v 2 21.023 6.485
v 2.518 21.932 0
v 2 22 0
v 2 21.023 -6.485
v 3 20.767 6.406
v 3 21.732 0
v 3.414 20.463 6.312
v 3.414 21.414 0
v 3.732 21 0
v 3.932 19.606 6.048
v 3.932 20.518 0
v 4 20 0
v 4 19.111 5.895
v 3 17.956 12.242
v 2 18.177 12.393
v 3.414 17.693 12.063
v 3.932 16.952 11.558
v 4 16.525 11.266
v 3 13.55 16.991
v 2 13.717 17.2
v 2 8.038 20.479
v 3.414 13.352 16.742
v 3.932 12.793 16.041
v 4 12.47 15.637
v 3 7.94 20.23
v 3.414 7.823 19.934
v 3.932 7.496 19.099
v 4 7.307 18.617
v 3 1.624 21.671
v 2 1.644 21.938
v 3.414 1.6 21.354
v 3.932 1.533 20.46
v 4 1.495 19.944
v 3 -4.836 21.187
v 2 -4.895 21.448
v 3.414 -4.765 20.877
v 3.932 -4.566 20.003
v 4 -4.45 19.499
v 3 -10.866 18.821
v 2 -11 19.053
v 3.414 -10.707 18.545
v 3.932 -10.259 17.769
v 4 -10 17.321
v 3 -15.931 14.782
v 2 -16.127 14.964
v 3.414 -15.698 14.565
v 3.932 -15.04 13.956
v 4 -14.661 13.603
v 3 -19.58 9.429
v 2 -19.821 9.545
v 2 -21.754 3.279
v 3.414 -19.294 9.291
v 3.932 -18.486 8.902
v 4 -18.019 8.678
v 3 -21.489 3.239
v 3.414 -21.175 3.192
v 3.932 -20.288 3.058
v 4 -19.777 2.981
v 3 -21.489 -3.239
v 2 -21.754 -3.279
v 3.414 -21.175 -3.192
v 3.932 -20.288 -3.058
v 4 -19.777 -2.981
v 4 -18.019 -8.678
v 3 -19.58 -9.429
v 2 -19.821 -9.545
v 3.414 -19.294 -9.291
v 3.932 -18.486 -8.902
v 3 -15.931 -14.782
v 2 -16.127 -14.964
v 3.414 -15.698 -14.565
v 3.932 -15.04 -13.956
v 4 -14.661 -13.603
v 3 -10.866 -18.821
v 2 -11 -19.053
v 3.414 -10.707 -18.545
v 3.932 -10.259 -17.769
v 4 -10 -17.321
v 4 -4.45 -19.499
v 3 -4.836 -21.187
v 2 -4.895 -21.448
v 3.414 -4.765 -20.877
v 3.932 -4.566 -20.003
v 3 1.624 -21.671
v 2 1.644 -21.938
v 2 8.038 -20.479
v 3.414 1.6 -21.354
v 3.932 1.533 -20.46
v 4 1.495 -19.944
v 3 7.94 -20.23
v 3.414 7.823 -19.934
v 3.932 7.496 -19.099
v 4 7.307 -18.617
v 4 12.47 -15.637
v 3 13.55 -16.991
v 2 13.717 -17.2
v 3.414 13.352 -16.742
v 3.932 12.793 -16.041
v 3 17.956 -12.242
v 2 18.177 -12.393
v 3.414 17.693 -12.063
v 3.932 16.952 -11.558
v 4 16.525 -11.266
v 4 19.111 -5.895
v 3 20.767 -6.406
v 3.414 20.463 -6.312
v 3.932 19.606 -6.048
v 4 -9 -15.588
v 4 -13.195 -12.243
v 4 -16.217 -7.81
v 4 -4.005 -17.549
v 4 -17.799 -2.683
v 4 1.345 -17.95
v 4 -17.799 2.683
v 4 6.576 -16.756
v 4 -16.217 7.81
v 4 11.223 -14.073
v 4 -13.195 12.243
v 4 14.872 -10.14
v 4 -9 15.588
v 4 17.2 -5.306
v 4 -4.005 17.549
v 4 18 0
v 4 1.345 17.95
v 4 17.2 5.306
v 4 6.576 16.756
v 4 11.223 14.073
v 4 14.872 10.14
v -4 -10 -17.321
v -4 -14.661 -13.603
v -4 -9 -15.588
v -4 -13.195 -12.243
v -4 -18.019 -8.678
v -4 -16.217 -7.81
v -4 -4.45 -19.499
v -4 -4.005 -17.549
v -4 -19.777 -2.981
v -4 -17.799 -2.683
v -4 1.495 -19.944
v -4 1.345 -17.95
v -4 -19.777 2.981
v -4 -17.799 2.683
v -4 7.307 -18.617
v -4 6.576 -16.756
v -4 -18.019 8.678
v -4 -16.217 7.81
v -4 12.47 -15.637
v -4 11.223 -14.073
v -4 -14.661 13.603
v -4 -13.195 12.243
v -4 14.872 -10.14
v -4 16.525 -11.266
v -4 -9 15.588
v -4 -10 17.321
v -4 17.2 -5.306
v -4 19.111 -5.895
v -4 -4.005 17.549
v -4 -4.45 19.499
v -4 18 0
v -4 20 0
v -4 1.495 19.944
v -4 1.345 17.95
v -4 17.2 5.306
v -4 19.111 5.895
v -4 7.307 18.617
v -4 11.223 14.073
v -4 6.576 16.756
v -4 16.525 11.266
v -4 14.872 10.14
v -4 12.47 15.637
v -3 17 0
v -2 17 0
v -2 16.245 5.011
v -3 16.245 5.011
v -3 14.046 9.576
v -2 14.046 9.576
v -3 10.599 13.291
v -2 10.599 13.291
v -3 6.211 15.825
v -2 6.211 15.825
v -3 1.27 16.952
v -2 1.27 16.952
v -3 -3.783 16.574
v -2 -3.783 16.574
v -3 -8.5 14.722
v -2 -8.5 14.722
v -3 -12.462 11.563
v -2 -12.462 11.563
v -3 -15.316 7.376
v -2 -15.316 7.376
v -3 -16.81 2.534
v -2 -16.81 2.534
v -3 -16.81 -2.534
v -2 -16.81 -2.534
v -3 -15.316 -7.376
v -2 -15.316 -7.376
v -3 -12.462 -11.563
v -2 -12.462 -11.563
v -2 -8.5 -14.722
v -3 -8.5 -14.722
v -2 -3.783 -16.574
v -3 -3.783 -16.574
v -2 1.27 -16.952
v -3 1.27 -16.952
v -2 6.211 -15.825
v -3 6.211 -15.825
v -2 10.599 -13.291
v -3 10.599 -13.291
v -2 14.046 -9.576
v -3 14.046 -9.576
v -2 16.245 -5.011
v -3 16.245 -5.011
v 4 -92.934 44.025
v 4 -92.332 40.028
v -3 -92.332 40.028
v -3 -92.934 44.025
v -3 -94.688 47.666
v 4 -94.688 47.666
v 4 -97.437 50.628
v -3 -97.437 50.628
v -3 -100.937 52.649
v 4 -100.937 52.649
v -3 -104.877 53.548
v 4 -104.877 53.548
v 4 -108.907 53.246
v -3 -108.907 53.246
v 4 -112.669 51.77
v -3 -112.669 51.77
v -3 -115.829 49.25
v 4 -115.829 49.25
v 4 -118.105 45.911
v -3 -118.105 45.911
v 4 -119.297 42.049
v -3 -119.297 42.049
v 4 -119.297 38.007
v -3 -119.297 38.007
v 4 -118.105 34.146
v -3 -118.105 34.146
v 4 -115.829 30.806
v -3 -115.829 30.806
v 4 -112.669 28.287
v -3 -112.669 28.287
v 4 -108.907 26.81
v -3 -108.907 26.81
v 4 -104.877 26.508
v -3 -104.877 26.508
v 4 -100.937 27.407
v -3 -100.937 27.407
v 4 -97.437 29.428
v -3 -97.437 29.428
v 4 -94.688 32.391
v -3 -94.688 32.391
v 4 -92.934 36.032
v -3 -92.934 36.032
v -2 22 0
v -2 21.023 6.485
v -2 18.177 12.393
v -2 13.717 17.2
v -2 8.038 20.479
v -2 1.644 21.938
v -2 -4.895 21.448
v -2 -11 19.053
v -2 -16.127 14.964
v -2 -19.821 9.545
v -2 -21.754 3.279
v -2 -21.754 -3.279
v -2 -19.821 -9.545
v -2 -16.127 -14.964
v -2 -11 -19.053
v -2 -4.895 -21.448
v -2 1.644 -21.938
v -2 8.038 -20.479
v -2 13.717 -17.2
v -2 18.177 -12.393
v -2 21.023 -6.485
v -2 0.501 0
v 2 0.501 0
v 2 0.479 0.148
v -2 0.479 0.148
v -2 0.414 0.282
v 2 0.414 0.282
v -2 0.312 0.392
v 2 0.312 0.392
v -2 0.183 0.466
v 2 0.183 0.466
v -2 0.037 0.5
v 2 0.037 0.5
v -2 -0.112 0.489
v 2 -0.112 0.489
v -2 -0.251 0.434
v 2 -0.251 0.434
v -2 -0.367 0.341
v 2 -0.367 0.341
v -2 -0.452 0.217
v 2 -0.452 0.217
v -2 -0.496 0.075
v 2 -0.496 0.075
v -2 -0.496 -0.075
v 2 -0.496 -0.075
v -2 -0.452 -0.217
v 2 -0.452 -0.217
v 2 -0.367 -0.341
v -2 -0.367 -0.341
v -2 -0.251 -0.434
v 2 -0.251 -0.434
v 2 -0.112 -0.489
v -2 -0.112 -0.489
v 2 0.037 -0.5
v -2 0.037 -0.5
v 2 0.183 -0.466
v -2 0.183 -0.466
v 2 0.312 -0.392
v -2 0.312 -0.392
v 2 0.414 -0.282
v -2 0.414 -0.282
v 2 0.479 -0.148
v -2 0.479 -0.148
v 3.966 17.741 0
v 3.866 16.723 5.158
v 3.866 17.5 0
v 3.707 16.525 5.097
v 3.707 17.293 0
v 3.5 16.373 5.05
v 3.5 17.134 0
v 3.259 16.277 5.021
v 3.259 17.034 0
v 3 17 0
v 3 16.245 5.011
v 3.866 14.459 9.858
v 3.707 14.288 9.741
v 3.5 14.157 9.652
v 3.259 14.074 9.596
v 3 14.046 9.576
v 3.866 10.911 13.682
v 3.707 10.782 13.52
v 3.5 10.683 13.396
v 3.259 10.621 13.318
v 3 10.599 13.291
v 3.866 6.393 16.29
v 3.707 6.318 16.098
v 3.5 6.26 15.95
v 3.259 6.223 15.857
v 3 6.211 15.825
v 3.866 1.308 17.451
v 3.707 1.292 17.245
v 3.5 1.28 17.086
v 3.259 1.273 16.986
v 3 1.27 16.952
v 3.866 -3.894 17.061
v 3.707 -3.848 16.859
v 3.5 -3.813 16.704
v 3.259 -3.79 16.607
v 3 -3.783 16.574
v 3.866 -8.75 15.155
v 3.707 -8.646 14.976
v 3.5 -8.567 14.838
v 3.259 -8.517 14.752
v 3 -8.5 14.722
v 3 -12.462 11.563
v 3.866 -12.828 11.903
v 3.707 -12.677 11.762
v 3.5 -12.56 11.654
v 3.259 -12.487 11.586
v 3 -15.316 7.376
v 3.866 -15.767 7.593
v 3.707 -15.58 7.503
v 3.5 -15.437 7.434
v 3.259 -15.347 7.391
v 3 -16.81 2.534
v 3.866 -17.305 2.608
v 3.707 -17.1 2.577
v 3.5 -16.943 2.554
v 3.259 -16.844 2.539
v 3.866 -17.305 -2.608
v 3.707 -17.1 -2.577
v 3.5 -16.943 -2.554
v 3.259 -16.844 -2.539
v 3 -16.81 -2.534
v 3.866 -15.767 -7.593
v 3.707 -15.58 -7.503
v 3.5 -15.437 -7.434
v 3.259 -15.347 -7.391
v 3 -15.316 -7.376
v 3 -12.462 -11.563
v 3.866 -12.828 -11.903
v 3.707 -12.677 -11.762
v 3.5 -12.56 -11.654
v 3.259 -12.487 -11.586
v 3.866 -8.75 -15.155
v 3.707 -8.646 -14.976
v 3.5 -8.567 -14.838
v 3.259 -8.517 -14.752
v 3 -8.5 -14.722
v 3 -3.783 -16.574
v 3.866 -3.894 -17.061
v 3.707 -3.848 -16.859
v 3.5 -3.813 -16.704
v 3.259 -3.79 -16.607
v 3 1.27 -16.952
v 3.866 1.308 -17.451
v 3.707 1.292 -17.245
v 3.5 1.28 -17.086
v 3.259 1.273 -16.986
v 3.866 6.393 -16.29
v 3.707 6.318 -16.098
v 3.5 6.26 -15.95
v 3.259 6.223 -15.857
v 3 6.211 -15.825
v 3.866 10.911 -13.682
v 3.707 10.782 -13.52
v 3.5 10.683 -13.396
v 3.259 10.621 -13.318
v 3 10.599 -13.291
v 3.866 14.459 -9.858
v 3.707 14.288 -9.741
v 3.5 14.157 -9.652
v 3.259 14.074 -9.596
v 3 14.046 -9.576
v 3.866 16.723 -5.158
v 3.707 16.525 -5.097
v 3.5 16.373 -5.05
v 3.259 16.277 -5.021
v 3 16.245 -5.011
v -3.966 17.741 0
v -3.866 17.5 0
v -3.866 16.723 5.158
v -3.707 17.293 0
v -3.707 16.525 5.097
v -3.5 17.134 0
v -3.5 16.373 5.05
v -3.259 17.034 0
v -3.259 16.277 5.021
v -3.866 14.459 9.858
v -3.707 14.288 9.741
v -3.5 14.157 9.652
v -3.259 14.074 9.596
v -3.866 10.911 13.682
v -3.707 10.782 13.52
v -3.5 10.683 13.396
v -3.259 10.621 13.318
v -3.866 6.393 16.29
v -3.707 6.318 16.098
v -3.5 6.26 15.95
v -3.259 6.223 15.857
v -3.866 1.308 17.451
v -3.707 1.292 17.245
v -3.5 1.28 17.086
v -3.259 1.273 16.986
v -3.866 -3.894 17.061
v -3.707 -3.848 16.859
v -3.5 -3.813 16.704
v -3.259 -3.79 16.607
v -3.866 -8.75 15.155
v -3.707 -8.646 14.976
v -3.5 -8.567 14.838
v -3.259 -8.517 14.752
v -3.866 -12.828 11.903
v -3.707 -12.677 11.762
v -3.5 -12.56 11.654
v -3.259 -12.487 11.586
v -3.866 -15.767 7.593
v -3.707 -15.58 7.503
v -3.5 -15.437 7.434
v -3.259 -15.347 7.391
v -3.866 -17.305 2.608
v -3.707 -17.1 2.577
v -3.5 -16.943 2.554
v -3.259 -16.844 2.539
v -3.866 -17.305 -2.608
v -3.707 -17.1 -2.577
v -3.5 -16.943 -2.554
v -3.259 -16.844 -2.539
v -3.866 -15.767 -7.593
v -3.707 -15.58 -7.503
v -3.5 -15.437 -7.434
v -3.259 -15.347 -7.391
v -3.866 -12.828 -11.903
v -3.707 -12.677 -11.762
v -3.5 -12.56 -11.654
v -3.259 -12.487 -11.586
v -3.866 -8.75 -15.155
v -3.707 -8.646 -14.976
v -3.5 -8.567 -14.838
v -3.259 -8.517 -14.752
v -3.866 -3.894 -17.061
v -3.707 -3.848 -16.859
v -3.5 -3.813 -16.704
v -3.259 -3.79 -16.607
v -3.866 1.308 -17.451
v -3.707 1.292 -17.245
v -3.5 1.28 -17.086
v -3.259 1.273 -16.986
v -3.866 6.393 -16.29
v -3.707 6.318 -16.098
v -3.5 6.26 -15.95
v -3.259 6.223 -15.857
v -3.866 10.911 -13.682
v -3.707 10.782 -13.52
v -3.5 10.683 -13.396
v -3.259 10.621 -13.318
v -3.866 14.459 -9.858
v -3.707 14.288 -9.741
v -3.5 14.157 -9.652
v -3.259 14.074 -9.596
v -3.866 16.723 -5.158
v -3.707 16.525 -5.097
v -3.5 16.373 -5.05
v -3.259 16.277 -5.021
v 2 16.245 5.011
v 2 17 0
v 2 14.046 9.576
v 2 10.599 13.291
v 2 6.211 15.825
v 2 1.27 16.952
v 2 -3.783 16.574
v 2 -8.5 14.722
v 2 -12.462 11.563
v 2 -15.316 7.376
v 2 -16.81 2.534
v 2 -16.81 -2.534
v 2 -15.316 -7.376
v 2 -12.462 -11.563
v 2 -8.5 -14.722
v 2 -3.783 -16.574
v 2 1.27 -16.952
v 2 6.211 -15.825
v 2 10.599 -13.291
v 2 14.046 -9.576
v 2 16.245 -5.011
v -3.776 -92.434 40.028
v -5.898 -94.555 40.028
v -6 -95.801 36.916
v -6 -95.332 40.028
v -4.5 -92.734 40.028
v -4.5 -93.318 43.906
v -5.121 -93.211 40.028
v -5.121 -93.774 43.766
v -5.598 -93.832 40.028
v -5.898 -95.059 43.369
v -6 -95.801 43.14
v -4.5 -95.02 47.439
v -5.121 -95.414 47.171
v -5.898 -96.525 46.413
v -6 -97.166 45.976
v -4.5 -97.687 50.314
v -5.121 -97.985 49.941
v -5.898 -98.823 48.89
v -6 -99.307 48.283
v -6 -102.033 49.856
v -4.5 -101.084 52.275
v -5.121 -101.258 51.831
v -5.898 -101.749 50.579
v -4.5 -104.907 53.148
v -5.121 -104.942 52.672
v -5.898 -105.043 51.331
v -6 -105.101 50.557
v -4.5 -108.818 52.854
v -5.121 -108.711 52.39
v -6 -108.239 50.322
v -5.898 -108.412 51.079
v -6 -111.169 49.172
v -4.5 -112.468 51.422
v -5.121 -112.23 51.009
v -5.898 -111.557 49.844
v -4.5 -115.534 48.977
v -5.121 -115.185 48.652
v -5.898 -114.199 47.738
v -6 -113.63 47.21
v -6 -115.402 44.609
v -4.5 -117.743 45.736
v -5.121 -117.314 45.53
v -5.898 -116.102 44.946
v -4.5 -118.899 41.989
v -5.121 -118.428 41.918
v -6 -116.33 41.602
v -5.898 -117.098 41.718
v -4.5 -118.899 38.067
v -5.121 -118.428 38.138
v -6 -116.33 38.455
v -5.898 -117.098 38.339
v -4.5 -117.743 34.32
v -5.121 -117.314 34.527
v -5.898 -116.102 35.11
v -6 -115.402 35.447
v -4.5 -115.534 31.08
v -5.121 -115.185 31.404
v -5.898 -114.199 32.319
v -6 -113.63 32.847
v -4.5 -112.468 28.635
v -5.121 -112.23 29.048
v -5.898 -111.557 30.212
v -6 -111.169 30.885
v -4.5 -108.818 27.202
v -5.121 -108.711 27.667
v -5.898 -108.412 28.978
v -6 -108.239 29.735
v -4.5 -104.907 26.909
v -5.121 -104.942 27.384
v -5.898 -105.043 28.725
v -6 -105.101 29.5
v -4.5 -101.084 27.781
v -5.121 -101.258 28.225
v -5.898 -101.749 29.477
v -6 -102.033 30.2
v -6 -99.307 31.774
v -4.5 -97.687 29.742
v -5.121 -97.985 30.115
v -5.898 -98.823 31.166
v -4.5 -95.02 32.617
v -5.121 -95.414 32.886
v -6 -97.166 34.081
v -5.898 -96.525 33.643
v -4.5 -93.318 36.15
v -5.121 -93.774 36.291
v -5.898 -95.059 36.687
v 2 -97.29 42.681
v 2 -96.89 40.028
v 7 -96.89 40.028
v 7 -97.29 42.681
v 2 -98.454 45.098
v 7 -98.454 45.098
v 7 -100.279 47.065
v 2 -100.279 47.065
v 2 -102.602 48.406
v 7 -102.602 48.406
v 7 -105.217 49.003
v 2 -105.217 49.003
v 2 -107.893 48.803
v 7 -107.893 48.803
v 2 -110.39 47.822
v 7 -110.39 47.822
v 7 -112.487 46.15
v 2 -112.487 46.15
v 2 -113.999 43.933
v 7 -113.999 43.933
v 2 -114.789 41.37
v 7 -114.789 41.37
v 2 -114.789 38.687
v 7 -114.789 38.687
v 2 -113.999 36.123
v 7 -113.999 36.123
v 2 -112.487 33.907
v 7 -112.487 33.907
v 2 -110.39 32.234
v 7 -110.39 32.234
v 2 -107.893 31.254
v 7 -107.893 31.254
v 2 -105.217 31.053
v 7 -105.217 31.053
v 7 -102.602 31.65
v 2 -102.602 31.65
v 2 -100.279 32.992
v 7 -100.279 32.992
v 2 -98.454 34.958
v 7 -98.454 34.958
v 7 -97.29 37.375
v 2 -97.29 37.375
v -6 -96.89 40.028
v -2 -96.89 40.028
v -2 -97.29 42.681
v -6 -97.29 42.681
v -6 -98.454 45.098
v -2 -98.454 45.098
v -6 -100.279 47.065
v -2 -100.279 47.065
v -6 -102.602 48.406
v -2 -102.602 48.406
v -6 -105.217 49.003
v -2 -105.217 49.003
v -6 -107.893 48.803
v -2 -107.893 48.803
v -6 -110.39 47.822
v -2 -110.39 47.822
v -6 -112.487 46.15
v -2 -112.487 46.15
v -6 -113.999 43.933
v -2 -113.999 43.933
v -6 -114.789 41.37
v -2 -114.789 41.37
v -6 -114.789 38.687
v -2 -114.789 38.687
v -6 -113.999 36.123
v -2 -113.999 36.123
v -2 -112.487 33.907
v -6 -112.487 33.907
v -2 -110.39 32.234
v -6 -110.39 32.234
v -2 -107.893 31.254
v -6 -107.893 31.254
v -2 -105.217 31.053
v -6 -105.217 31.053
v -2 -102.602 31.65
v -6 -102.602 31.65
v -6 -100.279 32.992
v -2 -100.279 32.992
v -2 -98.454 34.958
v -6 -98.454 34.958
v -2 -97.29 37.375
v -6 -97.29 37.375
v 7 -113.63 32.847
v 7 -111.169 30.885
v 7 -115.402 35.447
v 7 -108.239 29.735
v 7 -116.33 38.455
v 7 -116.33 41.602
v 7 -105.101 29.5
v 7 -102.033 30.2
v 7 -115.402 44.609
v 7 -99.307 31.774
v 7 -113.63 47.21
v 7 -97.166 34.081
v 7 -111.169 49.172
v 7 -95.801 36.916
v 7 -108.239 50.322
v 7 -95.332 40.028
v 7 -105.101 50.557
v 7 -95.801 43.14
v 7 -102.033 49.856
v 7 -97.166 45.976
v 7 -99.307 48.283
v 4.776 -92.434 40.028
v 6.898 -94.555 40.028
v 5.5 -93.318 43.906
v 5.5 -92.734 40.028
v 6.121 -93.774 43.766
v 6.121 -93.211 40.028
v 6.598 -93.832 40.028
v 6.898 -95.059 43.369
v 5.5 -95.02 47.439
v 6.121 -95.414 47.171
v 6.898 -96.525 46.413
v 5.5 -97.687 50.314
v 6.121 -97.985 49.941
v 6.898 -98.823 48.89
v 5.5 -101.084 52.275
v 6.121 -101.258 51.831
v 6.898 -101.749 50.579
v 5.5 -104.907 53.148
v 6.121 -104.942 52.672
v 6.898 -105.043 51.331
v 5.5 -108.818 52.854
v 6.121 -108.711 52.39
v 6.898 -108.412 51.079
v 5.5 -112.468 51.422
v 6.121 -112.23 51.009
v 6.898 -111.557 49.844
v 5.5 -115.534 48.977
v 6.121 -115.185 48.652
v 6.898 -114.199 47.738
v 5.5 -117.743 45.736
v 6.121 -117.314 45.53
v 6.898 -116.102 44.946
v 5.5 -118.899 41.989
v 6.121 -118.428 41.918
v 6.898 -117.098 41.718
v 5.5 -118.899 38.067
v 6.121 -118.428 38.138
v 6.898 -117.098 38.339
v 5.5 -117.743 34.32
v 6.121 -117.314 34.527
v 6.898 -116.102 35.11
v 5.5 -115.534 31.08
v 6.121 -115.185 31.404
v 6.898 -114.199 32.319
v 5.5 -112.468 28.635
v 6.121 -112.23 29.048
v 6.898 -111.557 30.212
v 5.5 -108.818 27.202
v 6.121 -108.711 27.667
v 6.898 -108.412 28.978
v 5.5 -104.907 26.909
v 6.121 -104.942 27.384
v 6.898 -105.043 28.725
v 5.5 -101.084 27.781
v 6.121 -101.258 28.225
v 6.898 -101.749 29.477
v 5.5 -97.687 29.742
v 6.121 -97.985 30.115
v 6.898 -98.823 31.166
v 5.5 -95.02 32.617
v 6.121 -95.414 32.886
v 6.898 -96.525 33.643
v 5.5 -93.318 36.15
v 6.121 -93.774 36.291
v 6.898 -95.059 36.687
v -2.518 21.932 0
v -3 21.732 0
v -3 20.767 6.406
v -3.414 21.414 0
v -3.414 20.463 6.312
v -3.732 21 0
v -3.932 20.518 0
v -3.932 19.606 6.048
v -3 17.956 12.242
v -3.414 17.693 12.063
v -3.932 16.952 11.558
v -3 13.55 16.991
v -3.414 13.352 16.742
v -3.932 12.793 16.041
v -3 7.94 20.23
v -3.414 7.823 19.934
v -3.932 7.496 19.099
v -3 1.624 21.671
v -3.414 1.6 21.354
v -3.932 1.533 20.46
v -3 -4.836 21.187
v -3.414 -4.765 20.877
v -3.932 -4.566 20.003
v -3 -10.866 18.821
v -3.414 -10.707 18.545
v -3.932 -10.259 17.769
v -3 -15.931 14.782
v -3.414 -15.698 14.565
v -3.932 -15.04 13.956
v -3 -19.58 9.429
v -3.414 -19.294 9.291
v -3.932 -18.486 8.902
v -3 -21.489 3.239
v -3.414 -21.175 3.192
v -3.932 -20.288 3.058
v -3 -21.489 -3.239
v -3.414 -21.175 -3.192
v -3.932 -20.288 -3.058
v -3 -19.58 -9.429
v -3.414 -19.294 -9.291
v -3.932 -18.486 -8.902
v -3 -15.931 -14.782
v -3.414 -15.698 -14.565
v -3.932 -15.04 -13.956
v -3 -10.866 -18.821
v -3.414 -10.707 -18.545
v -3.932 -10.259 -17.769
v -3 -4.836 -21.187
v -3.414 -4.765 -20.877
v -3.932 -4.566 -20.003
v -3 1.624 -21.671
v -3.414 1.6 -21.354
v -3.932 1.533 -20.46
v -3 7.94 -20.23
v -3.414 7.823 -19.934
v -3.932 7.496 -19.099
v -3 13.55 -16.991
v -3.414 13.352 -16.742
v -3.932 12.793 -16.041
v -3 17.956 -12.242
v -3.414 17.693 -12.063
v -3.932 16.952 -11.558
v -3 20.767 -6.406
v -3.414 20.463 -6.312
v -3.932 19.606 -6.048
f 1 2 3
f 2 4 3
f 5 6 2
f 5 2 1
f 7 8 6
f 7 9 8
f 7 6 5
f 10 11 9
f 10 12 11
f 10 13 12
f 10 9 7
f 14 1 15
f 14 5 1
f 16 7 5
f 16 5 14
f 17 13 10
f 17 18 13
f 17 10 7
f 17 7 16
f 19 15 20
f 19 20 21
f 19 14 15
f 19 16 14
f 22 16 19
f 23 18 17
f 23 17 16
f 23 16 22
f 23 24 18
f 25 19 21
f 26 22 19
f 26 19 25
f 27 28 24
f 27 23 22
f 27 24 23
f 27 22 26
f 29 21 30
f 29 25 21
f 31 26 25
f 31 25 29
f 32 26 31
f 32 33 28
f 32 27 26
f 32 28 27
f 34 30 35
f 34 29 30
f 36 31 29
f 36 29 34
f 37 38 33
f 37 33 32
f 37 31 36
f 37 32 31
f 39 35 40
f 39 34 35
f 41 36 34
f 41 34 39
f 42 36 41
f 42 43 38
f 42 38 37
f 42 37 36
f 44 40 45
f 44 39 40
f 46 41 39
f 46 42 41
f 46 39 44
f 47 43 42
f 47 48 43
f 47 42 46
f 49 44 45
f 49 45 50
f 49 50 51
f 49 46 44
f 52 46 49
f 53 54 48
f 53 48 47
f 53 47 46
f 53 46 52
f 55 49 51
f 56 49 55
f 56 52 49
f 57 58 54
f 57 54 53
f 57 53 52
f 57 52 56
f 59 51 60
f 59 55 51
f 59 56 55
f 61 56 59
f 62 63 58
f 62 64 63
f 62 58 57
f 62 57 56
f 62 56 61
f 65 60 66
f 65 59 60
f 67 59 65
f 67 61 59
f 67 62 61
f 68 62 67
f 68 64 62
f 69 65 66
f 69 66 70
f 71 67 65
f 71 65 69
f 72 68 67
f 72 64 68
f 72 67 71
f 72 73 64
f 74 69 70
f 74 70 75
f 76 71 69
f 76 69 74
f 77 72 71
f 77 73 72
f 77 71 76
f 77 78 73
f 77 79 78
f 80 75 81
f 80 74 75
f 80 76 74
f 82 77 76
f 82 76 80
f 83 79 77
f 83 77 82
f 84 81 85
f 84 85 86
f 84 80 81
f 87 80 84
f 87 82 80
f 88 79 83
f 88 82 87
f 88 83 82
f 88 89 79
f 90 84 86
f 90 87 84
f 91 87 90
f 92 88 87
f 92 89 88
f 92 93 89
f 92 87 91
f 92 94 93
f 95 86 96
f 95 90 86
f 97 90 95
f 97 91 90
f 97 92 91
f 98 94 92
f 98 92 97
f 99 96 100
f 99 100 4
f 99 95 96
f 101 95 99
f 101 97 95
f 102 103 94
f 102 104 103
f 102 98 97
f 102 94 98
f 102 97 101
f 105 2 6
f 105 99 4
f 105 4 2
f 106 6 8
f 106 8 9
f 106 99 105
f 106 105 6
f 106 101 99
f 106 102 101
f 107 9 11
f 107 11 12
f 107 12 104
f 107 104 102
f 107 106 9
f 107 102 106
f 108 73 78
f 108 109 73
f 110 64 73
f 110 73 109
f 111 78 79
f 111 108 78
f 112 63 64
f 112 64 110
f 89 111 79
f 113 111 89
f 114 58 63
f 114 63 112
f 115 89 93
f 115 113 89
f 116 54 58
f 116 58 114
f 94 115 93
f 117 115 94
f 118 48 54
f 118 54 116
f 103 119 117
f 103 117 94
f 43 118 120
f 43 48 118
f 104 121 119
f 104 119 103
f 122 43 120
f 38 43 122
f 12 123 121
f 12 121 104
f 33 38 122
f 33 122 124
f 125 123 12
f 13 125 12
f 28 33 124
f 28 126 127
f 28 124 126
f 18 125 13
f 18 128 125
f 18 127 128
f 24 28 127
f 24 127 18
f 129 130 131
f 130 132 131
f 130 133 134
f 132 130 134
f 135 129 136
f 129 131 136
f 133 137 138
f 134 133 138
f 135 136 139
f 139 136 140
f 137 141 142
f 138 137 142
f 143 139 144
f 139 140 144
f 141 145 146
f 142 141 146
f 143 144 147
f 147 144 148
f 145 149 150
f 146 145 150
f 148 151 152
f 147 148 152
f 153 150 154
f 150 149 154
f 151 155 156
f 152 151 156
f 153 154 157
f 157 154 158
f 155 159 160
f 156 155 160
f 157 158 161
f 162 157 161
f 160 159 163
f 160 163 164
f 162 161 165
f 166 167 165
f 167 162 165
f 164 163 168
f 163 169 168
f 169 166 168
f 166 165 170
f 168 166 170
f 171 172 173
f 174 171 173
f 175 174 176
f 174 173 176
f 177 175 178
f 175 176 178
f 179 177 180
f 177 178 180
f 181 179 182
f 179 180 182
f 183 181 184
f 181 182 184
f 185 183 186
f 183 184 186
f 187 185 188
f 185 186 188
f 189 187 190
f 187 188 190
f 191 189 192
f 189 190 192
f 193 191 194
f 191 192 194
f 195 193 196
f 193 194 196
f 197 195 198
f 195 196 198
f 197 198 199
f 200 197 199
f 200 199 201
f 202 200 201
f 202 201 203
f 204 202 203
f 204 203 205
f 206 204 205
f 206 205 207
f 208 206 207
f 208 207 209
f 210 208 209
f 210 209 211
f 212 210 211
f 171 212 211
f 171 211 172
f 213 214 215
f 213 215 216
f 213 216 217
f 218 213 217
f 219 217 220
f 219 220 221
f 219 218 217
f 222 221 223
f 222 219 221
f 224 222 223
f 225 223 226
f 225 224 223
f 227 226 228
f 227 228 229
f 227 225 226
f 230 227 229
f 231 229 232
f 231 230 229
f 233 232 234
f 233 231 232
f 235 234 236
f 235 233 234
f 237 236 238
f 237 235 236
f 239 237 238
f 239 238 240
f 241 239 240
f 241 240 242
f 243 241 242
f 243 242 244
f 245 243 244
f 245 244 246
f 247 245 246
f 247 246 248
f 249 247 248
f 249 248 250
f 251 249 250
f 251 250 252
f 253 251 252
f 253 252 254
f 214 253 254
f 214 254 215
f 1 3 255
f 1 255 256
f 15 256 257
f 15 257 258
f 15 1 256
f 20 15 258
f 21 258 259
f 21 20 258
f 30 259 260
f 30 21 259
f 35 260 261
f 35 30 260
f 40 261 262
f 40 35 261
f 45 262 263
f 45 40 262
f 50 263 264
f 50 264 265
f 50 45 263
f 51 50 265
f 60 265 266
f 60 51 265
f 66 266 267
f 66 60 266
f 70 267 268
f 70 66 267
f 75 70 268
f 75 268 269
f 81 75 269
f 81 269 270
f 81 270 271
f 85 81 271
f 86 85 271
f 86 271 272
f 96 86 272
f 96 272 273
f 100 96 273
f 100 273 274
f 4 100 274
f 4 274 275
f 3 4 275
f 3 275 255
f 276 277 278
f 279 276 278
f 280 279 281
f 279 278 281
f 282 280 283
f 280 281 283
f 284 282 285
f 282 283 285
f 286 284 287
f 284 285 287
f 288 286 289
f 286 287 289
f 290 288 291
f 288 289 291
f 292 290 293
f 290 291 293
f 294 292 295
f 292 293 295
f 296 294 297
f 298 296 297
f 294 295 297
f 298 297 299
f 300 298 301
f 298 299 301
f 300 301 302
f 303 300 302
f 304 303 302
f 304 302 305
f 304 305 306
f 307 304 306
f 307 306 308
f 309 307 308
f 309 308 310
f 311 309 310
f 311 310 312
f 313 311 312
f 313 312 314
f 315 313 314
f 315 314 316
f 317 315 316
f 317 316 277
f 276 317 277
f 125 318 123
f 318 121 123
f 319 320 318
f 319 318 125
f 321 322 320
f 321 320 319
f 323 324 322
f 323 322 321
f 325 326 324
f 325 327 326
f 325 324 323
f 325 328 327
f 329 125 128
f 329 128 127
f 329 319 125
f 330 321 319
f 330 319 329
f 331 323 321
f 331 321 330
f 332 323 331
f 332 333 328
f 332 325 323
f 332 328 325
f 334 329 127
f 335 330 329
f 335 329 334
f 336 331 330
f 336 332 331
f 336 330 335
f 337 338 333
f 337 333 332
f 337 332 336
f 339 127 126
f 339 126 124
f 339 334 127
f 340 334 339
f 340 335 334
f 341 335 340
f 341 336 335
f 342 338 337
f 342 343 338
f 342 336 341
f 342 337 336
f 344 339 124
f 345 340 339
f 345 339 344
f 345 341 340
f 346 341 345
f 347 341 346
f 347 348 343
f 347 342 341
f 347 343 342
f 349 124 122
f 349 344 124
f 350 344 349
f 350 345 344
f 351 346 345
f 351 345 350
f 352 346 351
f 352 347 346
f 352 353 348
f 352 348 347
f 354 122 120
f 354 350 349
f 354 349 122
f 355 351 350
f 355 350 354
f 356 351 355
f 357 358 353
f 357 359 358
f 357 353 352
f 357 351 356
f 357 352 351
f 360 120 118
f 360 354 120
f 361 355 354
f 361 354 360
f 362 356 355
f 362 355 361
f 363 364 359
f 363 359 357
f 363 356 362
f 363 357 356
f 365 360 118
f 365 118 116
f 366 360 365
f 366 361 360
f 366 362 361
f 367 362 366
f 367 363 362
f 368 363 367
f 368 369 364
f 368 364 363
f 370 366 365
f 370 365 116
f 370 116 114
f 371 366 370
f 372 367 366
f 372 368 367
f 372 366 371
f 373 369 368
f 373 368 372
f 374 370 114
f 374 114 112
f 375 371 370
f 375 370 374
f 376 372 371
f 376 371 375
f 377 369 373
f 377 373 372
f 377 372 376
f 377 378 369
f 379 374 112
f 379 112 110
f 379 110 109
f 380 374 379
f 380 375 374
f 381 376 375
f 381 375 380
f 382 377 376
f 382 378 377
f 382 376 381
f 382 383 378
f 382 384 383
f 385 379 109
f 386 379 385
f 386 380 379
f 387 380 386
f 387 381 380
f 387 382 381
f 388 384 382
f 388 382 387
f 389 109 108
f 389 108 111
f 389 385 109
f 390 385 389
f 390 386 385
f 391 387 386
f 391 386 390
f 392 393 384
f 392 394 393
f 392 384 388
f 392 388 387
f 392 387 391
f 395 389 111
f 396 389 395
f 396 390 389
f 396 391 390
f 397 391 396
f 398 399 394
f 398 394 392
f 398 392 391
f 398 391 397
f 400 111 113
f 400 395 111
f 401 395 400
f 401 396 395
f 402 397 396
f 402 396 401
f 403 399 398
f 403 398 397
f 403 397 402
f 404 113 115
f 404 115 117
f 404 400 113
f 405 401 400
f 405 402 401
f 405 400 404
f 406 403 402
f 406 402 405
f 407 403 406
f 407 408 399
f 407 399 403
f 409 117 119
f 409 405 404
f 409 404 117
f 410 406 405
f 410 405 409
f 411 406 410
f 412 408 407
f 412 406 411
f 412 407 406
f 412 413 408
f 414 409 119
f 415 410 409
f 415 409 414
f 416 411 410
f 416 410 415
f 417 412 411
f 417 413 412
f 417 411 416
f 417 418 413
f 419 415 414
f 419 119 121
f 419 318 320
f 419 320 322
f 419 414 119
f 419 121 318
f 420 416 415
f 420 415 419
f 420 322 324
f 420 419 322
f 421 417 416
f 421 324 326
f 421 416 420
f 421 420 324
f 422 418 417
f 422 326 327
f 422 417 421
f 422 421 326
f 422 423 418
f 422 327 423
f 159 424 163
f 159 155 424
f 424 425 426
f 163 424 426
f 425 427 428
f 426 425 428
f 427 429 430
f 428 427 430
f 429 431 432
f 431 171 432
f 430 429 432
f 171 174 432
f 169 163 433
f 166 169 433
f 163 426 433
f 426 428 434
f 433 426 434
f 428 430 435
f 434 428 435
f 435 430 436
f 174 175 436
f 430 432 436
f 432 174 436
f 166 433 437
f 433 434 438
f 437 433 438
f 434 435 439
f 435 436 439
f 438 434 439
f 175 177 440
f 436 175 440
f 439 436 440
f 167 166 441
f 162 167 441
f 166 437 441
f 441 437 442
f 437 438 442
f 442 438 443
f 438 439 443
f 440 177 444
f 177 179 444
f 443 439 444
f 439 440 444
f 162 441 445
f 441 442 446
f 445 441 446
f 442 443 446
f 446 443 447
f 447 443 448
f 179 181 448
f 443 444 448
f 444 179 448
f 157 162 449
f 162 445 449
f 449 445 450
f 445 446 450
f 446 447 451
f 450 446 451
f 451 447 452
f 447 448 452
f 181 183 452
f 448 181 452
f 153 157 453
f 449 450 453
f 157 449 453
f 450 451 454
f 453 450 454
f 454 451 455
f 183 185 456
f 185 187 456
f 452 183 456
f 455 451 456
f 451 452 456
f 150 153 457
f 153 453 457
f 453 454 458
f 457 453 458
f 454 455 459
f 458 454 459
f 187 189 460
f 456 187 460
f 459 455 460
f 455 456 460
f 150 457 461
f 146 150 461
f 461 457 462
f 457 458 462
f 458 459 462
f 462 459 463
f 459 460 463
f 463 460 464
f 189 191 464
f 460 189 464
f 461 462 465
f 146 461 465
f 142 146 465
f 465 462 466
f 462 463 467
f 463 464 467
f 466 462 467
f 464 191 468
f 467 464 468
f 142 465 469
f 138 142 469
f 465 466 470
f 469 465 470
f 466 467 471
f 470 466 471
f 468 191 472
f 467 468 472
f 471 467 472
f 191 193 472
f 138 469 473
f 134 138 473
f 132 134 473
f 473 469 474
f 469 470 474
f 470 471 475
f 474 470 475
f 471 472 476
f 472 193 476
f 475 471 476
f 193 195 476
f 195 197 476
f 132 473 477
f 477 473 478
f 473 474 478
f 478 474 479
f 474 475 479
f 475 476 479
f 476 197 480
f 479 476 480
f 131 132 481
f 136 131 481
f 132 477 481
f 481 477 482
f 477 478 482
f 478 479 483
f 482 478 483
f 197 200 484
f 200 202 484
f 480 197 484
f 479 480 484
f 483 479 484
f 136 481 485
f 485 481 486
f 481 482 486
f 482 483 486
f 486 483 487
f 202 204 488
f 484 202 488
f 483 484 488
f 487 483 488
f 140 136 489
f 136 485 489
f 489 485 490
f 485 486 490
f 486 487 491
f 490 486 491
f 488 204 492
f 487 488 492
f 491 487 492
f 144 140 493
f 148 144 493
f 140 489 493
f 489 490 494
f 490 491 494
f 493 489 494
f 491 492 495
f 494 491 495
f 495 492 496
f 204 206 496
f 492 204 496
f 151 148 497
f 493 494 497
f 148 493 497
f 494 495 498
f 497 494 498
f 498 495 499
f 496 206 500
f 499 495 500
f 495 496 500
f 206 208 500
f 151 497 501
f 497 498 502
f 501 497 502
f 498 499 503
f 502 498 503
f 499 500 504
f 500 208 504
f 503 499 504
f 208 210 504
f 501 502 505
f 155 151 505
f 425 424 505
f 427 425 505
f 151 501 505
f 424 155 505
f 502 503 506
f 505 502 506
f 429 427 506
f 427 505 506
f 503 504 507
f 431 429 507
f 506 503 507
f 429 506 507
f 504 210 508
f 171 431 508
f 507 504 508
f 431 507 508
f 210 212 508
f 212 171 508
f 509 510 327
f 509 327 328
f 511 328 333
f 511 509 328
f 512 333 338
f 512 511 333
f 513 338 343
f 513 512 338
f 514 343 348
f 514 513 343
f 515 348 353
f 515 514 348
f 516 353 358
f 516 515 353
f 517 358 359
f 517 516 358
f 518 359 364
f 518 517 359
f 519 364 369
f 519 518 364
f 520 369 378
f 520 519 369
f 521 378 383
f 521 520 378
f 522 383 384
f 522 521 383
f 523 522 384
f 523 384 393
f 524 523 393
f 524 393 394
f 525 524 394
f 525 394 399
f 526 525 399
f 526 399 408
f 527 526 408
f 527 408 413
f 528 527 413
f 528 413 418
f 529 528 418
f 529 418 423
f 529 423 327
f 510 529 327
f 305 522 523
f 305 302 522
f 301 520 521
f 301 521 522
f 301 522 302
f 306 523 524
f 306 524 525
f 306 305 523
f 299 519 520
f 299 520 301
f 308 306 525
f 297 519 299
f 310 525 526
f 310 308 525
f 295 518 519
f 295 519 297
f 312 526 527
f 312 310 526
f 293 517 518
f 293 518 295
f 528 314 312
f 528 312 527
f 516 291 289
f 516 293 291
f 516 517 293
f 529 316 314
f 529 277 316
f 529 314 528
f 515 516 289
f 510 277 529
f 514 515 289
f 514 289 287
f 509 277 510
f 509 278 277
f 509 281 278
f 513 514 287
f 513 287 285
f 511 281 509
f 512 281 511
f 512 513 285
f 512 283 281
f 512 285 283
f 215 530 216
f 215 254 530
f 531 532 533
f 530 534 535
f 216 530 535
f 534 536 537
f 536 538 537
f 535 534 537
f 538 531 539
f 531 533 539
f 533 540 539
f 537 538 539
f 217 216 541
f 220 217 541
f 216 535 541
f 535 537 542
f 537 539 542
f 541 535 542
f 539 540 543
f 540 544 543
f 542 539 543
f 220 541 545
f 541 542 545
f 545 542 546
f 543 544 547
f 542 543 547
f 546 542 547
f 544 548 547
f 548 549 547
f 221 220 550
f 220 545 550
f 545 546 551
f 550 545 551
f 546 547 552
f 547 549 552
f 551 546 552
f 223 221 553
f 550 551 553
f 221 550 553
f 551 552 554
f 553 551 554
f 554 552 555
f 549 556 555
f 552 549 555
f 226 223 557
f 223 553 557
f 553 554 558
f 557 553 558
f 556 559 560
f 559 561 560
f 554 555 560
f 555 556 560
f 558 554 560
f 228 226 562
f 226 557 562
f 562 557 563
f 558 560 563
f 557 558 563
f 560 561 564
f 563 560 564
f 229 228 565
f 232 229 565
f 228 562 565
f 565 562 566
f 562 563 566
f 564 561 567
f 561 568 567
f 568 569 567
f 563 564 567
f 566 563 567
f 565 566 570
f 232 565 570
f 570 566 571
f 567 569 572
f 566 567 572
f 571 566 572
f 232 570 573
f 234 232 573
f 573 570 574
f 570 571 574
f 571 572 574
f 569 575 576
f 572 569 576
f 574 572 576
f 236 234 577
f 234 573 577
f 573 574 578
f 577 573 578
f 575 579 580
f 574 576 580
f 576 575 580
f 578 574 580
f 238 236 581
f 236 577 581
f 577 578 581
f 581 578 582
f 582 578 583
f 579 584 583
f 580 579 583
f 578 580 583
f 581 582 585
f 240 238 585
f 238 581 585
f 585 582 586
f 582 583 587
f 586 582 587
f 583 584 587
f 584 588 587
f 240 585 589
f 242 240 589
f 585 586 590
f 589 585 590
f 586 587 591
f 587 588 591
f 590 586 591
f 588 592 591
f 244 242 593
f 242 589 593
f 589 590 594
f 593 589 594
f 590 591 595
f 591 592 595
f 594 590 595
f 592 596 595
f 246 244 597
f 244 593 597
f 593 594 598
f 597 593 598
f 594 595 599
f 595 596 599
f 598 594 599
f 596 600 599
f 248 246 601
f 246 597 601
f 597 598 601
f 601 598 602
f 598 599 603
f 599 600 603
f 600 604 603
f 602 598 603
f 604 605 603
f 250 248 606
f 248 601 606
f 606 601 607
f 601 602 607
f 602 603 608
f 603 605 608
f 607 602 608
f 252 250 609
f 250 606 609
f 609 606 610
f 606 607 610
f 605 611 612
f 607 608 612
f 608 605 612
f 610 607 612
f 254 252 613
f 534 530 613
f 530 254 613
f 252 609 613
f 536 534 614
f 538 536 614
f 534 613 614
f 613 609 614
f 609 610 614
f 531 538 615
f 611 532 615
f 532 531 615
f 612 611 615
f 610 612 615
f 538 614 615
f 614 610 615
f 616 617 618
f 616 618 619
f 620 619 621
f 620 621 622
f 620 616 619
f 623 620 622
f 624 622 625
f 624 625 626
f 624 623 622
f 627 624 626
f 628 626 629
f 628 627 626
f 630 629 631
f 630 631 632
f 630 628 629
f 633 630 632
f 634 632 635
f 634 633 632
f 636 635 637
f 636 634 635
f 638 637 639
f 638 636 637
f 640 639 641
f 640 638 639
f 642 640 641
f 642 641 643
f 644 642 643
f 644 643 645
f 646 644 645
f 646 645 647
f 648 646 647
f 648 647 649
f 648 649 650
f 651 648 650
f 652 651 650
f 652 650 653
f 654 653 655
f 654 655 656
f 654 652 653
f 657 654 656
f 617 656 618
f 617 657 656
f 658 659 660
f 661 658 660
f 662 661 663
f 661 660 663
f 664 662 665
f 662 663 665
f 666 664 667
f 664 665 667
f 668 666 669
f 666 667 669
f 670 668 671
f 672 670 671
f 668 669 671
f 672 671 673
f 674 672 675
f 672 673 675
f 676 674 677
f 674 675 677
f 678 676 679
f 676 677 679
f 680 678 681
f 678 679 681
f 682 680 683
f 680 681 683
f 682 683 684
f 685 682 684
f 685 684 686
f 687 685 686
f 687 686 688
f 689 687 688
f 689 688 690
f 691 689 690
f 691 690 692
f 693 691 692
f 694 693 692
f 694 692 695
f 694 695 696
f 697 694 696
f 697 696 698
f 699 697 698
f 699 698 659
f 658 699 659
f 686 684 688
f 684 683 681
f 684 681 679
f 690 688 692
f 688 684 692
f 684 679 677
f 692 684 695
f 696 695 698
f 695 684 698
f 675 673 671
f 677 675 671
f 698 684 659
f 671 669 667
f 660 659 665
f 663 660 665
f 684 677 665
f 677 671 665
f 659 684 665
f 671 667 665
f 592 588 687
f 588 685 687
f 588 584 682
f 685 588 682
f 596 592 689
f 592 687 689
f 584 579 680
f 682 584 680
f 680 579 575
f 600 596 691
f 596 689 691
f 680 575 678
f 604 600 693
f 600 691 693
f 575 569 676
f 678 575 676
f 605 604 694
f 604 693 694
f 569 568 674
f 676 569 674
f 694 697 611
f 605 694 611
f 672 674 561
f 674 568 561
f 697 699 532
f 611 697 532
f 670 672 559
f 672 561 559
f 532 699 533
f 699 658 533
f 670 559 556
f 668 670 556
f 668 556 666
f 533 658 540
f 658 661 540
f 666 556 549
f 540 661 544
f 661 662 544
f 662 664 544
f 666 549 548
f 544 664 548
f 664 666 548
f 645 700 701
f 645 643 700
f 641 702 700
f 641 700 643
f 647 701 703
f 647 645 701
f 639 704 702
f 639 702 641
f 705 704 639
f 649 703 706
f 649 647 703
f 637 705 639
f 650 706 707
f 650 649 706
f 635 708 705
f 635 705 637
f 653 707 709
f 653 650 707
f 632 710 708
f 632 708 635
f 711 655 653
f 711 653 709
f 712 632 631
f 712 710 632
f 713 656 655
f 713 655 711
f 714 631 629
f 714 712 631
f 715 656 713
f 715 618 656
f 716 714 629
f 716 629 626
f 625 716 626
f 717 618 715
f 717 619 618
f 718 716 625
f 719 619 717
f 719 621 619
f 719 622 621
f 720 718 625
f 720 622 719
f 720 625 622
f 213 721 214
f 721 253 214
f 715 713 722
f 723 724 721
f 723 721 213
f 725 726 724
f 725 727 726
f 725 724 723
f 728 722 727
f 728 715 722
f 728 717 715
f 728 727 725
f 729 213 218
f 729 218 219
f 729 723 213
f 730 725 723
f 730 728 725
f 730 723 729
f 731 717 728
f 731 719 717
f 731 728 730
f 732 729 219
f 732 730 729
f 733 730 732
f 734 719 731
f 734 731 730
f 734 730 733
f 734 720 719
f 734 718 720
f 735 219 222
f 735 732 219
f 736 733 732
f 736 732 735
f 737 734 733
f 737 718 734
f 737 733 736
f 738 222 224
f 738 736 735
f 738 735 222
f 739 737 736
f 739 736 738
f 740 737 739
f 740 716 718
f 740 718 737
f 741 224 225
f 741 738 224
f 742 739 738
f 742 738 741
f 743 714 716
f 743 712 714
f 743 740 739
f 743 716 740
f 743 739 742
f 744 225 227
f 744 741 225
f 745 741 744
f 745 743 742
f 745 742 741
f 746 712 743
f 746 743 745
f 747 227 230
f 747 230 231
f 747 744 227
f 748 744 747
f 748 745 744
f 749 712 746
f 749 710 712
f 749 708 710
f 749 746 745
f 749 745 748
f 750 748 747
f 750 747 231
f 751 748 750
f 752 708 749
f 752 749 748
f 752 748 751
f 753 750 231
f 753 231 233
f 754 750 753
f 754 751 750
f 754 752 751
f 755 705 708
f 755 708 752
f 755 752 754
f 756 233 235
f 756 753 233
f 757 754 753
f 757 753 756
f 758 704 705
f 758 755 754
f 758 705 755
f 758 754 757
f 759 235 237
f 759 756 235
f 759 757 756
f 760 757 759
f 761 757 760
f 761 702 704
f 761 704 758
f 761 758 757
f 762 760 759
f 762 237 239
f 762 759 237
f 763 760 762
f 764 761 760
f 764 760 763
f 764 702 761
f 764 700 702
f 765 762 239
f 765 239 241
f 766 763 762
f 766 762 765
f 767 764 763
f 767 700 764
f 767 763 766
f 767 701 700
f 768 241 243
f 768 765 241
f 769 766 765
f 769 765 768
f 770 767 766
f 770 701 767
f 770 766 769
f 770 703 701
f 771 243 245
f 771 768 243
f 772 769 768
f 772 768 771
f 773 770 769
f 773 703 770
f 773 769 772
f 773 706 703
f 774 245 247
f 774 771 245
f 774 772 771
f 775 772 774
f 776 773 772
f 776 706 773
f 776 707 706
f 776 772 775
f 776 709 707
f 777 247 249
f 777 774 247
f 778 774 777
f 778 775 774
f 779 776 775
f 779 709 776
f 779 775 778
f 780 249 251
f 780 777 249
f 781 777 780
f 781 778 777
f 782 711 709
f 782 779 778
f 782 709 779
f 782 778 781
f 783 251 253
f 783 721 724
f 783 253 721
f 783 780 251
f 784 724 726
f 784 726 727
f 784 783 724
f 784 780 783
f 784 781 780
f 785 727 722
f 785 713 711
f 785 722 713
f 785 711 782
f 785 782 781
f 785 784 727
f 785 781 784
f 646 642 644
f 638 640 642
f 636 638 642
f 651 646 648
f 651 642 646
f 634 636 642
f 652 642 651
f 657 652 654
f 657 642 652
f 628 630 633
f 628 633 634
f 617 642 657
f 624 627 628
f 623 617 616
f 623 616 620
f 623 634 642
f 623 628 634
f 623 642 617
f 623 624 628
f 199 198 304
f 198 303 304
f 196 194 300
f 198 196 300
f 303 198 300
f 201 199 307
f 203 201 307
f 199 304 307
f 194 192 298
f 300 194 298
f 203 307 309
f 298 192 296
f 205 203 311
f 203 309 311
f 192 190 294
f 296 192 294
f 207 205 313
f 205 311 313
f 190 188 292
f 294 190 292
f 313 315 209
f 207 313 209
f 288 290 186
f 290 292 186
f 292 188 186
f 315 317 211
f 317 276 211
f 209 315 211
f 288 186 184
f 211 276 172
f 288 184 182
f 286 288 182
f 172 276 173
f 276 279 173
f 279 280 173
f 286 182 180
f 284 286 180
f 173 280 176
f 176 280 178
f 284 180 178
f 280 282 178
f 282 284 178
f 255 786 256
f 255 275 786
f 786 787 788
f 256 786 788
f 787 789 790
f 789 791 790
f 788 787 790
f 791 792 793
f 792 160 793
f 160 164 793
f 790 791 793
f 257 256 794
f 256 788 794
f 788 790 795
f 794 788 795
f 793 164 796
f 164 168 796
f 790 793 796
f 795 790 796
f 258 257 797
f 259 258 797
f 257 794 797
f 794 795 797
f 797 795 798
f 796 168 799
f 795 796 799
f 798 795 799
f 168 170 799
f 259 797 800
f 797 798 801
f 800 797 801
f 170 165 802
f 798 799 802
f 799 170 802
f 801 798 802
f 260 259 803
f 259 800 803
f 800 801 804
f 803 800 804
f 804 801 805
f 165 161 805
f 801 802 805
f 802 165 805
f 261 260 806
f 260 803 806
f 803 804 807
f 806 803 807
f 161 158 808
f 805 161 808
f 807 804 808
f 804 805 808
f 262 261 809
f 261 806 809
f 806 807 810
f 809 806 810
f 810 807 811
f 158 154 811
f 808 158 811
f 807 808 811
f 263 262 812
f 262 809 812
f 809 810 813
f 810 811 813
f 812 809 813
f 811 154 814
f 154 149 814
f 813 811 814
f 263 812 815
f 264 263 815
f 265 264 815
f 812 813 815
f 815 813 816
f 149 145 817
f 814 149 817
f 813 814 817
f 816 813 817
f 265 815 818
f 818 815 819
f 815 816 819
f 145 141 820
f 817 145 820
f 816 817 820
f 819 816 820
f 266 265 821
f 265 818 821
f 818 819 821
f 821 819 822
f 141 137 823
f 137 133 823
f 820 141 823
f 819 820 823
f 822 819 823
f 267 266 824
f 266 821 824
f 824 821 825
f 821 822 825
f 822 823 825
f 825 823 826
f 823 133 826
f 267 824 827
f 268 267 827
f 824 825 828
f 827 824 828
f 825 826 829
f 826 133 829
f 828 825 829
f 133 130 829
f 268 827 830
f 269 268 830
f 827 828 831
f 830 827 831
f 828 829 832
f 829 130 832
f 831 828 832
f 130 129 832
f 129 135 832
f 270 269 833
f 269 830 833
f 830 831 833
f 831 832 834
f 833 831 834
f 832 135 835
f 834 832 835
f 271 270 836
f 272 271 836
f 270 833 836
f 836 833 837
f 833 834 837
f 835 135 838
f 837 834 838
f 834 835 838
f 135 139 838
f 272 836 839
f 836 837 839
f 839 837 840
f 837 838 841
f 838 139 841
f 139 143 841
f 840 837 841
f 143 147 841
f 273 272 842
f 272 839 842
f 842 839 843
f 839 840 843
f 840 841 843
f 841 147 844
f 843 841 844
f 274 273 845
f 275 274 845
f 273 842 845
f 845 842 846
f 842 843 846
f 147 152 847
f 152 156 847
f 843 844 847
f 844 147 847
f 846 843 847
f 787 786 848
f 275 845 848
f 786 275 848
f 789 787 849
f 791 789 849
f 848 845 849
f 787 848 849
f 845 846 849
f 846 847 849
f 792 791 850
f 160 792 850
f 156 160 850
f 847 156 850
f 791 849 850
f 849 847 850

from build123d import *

# Parameters (mm, degrees)
F0_R           = 17.000001
F1_DEPTH       = 2
F1_DEPTH_BACK  = 2
F0_R_2         = 22
F2_DEPTH       = 4
F2_DEPTH_BACK  = 4
F3_R           = 2
F4_R           = 1
F5_R           = 0.501139
F6_DEPTH       = 25
F6_DEPTH_BACK  = 25
F7_R           = 9.000003
F8_DEPTH       = 2
F8_DEPTH_BACK  = 2
F9_R           = 13.558076
F9_R_2         = 9.000003
F10_DEPTH      = 5
F10_DEPTH_BACK = 8
F11_R          = 3


with BuildPart() as f1:
    # F0 (on Right) → F1 (new body, two sides)
    with BuildSketch(Plane.YZ) as f1_sk:
        Circle(F0_R)
    extrude(amount=F1_DEPTH)
    extrude(f1_sk.sketch, amount=-F1_DEPTH_BACK)

    # F0 (on Right) → F2 (join, two sides)
    with BuildSketch(Plane.YZ) as f2_sk:
        Circle(F0_R_2)
        Circle(F0_R, mode=Mode.SUBTRACT)
    extrude(amount=F2_DEPTH)
    extrude(f2_sk.sketch, amount=-F2_DEPTH_BACK)

    # F3
    f3_edges = [f1.edges().sort_by_distance(p)[0] for p in [
        (4, -22, 0),
        (-4, -22, 0),
    ]]
    fillet(f3_edges, radius=F3_R)

    # F4
    f4_edges = [f1.edges().sort_by_distance(p)[0] for p in [
        (4, -17.000001, 0),
        (-4, -17.000001, 0),
    ]]
    fillet(f4_edges, radius=F4_R)

    # F5 (on face) → F6 (cut, two sides)
    with BuildSketch(Plane.YZ.offset(2)) as f6_sk:
        Circle(F5_R)
    extrude(amount=-F6_DEPTH, mode=Mode.SUBTRACT)
    extrude(f6_sk.sketch, amount=-F6_DEPTH_BACK, mode=Mode.SUBTRACT)


with BuildPart() as f8:
    # F7 (on Right) → F8 (new body, two sides)
    with BuildSketch(Plane.YZ) as f8_sk:
        with Locations((-105.889991, 40.028192)):
            Circle(F7_R)
    extrude(amount=F8_DEPTH)
    extrude(f8_sk.sketch, amount=-F8_DEPTH_BACK)

    # F9 (on face) → F10 (join, two sides)
    with BuildSketch(Plane.YZ.offset(2)) as f10_sk:
        with Locations((-105.889991, 40.028192)):
            Circle(F9_R)
        with Locations((-105.889991, 40.028192)):
            Circle(F9_R_2, mode=Mode.SUBTRACT)
    extrude(amount=F10_DEPTH)
    extrude(f10_sk.sketch, amount=-F10_DEPTH_BACK)

    # F11
    f11_edges = [f8.edges().sort_by_distance(p)[0] for p in [
        (7, -119.448067, 40.028192),
        (-6, -119.448067, 40.028192),
    ]]
    fillet(f11_edges, radius=F11_R)


solid = Compound([f1.part, f8.part])
